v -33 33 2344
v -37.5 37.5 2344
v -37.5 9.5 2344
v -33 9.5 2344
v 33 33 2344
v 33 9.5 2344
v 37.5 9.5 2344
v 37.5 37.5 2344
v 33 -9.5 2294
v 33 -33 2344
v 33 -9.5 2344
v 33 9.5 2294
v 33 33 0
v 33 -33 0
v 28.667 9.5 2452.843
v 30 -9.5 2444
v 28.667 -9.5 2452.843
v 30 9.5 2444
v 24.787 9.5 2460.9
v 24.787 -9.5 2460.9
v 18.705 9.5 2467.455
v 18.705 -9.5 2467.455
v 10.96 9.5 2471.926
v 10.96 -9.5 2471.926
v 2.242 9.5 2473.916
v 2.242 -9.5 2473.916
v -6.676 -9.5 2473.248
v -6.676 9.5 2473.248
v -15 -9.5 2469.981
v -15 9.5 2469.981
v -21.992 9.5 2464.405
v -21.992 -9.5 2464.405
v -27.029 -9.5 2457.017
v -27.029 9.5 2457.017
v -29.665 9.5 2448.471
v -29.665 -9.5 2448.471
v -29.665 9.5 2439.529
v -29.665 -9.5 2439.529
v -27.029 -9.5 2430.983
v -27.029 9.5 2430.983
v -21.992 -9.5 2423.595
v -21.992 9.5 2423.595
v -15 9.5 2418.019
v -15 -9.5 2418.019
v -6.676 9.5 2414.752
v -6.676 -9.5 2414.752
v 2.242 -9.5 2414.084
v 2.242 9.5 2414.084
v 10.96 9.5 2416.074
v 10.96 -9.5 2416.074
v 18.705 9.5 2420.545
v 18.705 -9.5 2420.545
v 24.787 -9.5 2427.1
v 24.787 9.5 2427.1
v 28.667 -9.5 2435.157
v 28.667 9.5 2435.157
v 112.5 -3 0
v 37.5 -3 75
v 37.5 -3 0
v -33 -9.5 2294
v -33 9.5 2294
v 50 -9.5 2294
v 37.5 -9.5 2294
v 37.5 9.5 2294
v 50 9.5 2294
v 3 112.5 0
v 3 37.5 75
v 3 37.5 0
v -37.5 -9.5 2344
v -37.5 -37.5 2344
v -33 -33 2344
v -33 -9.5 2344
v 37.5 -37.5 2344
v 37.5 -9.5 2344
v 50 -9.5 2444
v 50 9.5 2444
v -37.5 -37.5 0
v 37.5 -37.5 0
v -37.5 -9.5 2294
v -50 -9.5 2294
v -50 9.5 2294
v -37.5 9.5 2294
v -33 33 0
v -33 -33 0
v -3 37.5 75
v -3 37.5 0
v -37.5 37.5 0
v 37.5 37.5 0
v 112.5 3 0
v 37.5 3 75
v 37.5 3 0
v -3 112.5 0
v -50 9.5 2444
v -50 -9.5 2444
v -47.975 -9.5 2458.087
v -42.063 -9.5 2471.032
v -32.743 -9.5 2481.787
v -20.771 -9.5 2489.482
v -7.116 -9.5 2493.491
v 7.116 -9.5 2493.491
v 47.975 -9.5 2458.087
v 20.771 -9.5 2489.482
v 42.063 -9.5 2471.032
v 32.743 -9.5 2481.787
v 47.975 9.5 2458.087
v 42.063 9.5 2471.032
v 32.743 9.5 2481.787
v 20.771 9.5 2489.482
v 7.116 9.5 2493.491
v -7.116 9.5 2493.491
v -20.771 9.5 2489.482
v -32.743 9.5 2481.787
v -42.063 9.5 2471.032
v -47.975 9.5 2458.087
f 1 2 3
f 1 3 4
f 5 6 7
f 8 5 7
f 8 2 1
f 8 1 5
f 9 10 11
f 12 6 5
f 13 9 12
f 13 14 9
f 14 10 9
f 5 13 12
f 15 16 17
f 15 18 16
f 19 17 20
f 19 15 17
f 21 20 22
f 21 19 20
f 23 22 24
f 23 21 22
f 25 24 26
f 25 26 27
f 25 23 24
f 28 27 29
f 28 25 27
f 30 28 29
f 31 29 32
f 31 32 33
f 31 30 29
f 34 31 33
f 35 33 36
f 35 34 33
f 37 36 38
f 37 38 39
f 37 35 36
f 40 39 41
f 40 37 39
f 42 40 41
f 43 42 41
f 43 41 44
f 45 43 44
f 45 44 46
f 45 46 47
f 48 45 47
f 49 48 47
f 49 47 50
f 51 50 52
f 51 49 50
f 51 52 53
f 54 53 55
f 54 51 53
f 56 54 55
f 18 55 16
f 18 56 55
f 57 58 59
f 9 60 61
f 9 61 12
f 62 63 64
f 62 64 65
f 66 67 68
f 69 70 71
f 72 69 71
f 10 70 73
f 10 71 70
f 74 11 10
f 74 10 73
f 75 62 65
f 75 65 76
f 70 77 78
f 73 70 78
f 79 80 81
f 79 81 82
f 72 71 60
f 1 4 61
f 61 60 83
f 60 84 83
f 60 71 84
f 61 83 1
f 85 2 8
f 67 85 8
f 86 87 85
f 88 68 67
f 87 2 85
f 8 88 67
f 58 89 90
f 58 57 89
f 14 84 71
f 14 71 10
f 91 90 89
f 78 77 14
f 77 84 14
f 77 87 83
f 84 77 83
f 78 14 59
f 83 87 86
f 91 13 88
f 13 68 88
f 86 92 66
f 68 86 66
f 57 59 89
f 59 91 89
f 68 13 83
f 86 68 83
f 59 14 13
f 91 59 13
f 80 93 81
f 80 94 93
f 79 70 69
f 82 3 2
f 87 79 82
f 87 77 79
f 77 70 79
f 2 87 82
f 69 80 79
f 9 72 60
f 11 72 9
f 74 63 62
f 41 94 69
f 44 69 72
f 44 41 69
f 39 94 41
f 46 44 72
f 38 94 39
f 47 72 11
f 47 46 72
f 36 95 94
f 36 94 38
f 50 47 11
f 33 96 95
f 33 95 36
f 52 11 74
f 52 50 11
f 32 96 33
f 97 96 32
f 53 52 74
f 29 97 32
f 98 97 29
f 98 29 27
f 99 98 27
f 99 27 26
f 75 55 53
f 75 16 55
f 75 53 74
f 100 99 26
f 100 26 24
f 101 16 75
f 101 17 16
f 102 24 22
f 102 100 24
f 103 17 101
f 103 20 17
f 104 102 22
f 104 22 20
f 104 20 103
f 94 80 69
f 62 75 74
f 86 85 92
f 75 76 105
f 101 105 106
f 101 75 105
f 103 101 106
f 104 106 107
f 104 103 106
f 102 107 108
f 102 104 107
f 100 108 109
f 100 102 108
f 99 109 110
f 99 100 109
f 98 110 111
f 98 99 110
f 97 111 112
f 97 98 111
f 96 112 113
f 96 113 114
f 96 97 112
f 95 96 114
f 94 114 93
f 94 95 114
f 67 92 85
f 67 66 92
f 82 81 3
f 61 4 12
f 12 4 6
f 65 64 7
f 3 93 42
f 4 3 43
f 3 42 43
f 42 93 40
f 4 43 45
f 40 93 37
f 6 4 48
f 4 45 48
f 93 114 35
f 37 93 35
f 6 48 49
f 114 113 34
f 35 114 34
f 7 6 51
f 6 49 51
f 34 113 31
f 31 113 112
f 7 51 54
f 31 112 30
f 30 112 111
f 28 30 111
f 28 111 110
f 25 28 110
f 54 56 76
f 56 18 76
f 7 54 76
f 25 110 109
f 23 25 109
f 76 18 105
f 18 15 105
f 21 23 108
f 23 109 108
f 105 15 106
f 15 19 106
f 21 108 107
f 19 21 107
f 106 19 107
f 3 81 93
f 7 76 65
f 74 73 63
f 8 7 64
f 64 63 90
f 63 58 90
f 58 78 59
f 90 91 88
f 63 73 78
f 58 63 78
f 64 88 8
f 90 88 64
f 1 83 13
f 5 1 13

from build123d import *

# Parameters (mm, degrees)
F0_W     = 75
F0_H     = 75
F0_W_2   = 66
F0_H_2   = 66
F1_DEPTH = 2344
F2_R     = 30
F3_DEPTH = 9.5
F5_DEPTH = 3
F7_DEPTH = 3


with BuildPart() as f1:
    # F0 (on Top) → F1 (new body)
    with BuildSketch(Plane.XY):
        Rectangle(F0_W, F0_H)
        Rectangle(F0_W_2, F0_H_2, mode=Mode.SUBTRACT)
    extrude(amount=F1_DEPTH)

    # F2 (on Front) → F3 (join, symmetric)
    with BuildSketch(Plane.XZ):
        with BuildLine():
            Line((-50, 2444), (-50, 2294))
            Line((-50, 2294), (50, 2294))
            Line((50, 2294), (50, 2444))
            ThreePointArc((50, 2444), (0, 2494), (-50, 2444))
        make_face()
        with Locations((0, 2444)):
            Circle(F2_R, mode=Mode.SUBTRACT)
    extrude(amount=F3_DEPTH, both=True)

    # F4 (on Front) → F5 (join, symmetric)
    with BuildSketch(Plane.XZ):
        Polygon((37.5, 75), (37.5, 0), (112.5, 0), align=None)
    extrude(amount=F5_DEPTH, both=True)

    # F6 (on Right) → F7 (join, symmetric)
    with BuildSketch(Plane.YZ):
        Polygon((37.5, 75), (37.5, 0), (112.5, 0), align=None)
    extrude(amount=F7_DEPTH, both=True)


solid = f1.part
